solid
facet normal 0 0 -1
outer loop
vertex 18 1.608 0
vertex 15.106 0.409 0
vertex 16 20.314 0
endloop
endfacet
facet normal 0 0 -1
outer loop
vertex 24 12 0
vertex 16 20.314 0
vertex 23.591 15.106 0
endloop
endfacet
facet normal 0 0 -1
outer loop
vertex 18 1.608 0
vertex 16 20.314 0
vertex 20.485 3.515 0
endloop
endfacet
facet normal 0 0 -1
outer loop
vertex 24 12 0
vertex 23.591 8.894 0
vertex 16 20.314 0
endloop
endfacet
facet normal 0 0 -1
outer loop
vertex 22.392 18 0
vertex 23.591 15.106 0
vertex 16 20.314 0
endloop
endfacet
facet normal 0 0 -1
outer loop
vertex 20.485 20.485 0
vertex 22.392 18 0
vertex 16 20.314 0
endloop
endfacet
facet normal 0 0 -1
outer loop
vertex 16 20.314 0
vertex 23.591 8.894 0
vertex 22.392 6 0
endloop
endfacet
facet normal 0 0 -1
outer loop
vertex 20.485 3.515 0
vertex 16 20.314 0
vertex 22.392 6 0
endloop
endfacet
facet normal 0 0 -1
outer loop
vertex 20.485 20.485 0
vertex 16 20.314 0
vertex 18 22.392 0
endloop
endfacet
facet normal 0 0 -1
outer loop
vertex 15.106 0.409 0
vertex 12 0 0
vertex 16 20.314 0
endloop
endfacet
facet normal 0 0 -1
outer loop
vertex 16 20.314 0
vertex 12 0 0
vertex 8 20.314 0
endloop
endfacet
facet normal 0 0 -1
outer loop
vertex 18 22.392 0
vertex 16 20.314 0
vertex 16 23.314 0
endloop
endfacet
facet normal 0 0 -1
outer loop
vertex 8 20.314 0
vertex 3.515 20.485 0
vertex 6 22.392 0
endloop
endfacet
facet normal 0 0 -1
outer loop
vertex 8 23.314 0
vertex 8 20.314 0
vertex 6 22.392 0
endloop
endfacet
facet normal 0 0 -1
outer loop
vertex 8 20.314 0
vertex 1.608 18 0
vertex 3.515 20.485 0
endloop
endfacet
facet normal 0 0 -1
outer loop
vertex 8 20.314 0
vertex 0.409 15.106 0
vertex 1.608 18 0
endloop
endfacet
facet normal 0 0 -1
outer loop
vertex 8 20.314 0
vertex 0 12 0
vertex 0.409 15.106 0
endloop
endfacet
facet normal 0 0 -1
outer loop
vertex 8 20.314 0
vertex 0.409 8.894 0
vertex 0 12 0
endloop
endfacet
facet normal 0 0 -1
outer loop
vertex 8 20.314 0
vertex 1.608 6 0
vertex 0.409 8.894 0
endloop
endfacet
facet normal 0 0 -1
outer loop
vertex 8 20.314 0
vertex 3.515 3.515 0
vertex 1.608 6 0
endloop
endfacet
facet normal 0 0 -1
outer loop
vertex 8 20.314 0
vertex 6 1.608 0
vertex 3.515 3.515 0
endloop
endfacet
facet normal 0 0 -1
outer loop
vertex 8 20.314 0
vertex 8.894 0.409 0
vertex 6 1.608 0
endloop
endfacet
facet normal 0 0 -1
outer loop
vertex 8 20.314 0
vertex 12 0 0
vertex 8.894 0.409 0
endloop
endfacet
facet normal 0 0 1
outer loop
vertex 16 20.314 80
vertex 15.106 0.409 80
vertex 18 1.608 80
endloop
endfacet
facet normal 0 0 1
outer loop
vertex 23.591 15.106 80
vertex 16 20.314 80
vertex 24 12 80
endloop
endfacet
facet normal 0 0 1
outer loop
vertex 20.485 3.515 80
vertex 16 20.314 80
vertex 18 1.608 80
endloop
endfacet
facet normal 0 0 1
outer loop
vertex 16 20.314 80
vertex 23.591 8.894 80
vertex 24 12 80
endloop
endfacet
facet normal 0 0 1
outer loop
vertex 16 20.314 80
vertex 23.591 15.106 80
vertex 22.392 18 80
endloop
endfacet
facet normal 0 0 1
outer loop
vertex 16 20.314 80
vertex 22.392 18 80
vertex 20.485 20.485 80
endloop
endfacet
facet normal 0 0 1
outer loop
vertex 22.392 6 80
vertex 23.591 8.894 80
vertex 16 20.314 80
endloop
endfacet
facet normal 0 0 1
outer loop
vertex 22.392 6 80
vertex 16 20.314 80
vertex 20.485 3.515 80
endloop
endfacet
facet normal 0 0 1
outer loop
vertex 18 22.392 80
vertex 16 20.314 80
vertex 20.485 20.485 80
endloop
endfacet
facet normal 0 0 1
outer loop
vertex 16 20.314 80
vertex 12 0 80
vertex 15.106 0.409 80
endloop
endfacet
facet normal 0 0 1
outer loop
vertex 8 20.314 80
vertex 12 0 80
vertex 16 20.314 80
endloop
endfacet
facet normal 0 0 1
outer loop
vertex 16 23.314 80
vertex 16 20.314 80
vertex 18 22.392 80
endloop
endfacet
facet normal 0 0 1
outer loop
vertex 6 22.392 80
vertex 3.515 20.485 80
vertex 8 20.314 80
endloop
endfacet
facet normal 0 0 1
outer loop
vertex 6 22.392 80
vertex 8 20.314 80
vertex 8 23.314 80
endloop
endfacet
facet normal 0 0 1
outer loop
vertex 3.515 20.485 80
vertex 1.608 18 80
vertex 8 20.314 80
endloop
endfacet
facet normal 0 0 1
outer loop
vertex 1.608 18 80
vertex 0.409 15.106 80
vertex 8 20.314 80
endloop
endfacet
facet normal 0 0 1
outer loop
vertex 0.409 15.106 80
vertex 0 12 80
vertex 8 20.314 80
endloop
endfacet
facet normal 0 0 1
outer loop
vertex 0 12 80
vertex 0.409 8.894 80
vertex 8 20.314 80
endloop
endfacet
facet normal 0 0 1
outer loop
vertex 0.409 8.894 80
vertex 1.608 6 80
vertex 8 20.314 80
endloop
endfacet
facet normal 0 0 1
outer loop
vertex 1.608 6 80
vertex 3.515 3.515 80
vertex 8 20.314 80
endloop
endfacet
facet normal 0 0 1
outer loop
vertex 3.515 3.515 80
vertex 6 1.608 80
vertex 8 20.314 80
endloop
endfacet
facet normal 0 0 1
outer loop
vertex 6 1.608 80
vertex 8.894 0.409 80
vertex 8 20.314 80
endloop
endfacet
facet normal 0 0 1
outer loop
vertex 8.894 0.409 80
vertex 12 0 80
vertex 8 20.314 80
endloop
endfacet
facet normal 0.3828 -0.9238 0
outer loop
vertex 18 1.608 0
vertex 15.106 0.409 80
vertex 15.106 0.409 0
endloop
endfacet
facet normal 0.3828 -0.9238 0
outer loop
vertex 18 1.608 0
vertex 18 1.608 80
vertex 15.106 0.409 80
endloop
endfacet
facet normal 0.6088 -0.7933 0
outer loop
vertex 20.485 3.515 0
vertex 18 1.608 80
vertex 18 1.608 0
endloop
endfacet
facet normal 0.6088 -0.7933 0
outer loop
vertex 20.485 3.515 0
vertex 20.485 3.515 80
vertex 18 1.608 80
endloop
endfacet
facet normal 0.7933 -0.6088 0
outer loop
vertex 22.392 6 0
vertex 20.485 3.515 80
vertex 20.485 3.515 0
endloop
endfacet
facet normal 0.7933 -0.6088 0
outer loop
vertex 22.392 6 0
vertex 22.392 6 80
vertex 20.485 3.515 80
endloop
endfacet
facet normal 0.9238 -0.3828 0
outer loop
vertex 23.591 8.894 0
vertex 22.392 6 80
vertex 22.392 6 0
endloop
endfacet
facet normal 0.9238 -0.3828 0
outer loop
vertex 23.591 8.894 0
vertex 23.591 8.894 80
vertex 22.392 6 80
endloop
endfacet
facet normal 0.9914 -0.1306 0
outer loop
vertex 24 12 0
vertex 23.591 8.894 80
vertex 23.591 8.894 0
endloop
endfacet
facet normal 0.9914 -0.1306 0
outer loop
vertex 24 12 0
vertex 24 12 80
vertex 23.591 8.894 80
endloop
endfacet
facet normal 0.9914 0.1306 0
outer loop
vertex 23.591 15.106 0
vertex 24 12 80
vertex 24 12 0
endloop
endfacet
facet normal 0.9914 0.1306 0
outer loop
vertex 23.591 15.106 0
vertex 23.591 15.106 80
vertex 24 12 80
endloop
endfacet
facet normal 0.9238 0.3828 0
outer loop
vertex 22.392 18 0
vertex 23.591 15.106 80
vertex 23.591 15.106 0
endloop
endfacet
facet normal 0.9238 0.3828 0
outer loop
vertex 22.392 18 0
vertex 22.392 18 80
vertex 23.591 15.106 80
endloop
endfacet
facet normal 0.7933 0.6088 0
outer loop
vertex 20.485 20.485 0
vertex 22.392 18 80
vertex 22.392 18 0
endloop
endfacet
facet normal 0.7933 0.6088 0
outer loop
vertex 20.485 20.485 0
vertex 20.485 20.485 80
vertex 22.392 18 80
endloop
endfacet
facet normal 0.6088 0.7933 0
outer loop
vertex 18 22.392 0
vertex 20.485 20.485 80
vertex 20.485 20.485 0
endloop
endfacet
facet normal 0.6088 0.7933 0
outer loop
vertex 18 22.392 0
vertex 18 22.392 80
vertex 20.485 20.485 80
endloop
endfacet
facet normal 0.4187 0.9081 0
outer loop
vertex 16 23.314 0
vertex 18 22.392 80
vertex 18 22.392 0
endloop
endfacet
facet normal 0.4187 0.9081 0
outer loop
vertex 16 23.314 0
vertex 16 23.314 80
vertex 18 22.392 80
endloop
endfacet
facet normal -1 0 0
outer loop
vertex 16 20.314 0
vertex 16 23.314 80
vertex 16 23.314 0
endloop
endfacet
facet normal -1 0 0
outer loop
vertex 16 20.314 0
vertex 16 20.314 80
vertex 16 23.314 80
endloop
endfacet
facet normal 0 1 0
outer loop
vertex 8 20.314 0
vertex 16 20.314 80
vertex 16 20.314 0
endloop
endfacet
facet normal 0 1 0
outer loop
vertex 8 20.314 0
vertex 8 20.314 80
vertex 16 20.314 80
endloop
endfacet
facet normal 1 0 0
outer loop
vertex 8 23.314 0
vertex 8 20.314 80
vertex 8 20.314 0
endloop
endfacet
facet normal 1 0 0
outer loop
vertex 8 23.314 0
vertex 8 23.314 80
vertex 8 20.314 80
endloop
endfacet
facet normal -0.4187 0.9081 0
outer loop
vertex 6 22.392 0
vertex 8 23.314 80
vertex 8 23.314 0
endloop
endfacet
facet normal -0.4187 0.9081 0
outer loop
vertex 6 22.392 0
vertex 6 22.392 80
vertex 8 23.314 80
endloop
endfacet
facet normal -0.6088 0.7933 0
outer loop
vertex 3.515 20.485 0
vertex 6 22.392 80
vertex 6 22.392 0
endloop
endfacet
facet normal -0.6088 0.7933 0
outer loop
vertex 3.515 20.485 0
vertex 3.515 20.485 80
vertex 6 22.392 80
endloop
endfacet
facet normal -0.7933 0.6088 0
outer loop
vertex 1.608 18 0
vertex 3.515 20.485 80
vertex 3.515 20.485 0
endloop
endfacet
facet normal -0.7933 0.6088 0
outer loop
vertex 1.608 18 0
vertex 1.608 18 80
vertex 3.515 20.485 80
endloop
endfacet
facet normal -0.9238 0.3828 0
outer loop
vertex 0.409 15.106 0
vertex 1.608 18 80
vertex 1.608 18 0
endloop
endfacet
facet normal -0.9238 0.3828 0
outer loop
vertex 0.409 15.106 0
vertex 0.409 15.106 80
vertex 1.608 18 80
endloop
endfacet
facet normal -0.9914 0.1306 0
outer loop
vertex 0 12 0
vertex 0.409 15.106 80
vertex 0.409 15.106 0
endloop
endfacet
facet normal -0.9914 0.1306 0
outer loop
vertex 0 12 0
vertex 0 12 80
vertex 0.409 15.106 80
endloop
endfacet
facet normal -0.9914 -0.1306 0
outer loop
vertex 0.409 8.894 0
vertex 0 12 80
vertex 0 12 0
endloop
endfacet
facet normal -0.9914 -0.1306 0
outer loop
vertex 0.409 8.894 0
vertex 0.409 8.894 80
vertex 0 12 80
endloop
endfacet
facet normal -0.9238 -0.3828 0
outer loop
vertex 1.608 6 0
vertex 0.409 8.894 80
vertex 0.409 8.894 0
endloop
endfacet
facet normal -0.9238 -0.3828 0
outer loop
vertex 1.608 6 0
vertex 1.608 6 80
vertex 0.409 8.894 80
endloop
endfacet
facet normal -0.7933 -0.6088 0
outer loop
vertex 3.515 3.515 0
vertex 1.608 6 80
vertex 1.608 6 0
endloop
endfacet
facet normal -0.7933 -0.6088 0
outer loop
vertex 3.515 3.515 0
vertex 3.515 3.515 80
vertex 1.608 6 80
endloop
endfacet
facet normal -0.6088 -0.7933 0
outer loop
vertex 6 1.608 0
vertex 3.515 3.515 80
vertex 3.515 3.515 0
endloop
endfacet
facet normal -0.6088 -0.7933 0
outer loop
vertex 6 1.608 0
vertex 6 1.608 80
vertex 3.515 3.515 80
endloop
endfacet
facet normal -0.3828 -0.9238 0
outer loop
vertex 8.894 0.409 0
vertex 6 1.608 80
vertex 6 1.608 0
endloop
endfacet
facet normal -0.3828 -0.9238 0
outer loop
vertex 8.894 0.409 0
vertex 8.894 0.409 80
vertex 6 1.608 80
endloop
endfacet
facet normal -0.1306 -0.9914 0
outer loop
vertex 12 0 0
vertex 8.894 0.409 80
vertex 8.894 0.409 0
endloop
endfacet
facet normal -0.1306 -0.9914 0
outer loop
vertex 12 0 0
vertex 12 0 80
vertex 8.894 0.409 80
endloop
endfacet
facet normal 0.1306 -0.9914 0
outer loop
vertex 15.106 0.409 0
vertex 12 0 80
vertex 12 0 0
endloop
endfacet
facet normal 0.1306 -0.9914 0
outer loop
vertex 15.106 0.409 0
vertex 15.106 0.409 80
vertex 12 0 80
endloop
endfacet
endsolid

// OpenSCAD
$fn = 32;

// ----------------------------------------------------------------------
// Keyway shaft: d24 shaft, key 8 x 3 mm
// ----------------------------------------------------------------------

// --- parameters (mm) ---
shaft_r = 12;             // shaft radius
key_w = 8;                // keyway width
key_d = 3;                // keyway depth below the surface line
plate_t = 80;             // shaft length, Z (extrusion height)
fit_tol = 0.1;            // declared fit tolerance (prompt contract)
free_tol = 0.5;           // declared free tolerance (prompt contract)

shaft_d = 2 * shaft_r;  // shaft diameter
circle_step = 15;  // polygon sampling step, degrees

profile = [[6, 22.392], [3.515, 20.485], [1.608, 18], [0.409, 15.106], [0, 12], [0.409, 8.894], [1.608, 6], [3.515, 3.515], [6, 1.608], [8.894, 0.409], [12, 0], [15.106, 0.409], [18, 1.608], [20.485, 3.515], [22.392, 6], [23.591, 8.894], [24, 12], [23.591, 15.106], [22.392, 18], [20.485, 20.485], [18, 22.392], [16, 23.314], [16, 20.314], [8, 20.314], [8, 23.314]];  // primary outline, 25 points, counter clockwise

// --- the one profile operation ---
linear_extrude(height = plate_t) polygon(points = profile);
